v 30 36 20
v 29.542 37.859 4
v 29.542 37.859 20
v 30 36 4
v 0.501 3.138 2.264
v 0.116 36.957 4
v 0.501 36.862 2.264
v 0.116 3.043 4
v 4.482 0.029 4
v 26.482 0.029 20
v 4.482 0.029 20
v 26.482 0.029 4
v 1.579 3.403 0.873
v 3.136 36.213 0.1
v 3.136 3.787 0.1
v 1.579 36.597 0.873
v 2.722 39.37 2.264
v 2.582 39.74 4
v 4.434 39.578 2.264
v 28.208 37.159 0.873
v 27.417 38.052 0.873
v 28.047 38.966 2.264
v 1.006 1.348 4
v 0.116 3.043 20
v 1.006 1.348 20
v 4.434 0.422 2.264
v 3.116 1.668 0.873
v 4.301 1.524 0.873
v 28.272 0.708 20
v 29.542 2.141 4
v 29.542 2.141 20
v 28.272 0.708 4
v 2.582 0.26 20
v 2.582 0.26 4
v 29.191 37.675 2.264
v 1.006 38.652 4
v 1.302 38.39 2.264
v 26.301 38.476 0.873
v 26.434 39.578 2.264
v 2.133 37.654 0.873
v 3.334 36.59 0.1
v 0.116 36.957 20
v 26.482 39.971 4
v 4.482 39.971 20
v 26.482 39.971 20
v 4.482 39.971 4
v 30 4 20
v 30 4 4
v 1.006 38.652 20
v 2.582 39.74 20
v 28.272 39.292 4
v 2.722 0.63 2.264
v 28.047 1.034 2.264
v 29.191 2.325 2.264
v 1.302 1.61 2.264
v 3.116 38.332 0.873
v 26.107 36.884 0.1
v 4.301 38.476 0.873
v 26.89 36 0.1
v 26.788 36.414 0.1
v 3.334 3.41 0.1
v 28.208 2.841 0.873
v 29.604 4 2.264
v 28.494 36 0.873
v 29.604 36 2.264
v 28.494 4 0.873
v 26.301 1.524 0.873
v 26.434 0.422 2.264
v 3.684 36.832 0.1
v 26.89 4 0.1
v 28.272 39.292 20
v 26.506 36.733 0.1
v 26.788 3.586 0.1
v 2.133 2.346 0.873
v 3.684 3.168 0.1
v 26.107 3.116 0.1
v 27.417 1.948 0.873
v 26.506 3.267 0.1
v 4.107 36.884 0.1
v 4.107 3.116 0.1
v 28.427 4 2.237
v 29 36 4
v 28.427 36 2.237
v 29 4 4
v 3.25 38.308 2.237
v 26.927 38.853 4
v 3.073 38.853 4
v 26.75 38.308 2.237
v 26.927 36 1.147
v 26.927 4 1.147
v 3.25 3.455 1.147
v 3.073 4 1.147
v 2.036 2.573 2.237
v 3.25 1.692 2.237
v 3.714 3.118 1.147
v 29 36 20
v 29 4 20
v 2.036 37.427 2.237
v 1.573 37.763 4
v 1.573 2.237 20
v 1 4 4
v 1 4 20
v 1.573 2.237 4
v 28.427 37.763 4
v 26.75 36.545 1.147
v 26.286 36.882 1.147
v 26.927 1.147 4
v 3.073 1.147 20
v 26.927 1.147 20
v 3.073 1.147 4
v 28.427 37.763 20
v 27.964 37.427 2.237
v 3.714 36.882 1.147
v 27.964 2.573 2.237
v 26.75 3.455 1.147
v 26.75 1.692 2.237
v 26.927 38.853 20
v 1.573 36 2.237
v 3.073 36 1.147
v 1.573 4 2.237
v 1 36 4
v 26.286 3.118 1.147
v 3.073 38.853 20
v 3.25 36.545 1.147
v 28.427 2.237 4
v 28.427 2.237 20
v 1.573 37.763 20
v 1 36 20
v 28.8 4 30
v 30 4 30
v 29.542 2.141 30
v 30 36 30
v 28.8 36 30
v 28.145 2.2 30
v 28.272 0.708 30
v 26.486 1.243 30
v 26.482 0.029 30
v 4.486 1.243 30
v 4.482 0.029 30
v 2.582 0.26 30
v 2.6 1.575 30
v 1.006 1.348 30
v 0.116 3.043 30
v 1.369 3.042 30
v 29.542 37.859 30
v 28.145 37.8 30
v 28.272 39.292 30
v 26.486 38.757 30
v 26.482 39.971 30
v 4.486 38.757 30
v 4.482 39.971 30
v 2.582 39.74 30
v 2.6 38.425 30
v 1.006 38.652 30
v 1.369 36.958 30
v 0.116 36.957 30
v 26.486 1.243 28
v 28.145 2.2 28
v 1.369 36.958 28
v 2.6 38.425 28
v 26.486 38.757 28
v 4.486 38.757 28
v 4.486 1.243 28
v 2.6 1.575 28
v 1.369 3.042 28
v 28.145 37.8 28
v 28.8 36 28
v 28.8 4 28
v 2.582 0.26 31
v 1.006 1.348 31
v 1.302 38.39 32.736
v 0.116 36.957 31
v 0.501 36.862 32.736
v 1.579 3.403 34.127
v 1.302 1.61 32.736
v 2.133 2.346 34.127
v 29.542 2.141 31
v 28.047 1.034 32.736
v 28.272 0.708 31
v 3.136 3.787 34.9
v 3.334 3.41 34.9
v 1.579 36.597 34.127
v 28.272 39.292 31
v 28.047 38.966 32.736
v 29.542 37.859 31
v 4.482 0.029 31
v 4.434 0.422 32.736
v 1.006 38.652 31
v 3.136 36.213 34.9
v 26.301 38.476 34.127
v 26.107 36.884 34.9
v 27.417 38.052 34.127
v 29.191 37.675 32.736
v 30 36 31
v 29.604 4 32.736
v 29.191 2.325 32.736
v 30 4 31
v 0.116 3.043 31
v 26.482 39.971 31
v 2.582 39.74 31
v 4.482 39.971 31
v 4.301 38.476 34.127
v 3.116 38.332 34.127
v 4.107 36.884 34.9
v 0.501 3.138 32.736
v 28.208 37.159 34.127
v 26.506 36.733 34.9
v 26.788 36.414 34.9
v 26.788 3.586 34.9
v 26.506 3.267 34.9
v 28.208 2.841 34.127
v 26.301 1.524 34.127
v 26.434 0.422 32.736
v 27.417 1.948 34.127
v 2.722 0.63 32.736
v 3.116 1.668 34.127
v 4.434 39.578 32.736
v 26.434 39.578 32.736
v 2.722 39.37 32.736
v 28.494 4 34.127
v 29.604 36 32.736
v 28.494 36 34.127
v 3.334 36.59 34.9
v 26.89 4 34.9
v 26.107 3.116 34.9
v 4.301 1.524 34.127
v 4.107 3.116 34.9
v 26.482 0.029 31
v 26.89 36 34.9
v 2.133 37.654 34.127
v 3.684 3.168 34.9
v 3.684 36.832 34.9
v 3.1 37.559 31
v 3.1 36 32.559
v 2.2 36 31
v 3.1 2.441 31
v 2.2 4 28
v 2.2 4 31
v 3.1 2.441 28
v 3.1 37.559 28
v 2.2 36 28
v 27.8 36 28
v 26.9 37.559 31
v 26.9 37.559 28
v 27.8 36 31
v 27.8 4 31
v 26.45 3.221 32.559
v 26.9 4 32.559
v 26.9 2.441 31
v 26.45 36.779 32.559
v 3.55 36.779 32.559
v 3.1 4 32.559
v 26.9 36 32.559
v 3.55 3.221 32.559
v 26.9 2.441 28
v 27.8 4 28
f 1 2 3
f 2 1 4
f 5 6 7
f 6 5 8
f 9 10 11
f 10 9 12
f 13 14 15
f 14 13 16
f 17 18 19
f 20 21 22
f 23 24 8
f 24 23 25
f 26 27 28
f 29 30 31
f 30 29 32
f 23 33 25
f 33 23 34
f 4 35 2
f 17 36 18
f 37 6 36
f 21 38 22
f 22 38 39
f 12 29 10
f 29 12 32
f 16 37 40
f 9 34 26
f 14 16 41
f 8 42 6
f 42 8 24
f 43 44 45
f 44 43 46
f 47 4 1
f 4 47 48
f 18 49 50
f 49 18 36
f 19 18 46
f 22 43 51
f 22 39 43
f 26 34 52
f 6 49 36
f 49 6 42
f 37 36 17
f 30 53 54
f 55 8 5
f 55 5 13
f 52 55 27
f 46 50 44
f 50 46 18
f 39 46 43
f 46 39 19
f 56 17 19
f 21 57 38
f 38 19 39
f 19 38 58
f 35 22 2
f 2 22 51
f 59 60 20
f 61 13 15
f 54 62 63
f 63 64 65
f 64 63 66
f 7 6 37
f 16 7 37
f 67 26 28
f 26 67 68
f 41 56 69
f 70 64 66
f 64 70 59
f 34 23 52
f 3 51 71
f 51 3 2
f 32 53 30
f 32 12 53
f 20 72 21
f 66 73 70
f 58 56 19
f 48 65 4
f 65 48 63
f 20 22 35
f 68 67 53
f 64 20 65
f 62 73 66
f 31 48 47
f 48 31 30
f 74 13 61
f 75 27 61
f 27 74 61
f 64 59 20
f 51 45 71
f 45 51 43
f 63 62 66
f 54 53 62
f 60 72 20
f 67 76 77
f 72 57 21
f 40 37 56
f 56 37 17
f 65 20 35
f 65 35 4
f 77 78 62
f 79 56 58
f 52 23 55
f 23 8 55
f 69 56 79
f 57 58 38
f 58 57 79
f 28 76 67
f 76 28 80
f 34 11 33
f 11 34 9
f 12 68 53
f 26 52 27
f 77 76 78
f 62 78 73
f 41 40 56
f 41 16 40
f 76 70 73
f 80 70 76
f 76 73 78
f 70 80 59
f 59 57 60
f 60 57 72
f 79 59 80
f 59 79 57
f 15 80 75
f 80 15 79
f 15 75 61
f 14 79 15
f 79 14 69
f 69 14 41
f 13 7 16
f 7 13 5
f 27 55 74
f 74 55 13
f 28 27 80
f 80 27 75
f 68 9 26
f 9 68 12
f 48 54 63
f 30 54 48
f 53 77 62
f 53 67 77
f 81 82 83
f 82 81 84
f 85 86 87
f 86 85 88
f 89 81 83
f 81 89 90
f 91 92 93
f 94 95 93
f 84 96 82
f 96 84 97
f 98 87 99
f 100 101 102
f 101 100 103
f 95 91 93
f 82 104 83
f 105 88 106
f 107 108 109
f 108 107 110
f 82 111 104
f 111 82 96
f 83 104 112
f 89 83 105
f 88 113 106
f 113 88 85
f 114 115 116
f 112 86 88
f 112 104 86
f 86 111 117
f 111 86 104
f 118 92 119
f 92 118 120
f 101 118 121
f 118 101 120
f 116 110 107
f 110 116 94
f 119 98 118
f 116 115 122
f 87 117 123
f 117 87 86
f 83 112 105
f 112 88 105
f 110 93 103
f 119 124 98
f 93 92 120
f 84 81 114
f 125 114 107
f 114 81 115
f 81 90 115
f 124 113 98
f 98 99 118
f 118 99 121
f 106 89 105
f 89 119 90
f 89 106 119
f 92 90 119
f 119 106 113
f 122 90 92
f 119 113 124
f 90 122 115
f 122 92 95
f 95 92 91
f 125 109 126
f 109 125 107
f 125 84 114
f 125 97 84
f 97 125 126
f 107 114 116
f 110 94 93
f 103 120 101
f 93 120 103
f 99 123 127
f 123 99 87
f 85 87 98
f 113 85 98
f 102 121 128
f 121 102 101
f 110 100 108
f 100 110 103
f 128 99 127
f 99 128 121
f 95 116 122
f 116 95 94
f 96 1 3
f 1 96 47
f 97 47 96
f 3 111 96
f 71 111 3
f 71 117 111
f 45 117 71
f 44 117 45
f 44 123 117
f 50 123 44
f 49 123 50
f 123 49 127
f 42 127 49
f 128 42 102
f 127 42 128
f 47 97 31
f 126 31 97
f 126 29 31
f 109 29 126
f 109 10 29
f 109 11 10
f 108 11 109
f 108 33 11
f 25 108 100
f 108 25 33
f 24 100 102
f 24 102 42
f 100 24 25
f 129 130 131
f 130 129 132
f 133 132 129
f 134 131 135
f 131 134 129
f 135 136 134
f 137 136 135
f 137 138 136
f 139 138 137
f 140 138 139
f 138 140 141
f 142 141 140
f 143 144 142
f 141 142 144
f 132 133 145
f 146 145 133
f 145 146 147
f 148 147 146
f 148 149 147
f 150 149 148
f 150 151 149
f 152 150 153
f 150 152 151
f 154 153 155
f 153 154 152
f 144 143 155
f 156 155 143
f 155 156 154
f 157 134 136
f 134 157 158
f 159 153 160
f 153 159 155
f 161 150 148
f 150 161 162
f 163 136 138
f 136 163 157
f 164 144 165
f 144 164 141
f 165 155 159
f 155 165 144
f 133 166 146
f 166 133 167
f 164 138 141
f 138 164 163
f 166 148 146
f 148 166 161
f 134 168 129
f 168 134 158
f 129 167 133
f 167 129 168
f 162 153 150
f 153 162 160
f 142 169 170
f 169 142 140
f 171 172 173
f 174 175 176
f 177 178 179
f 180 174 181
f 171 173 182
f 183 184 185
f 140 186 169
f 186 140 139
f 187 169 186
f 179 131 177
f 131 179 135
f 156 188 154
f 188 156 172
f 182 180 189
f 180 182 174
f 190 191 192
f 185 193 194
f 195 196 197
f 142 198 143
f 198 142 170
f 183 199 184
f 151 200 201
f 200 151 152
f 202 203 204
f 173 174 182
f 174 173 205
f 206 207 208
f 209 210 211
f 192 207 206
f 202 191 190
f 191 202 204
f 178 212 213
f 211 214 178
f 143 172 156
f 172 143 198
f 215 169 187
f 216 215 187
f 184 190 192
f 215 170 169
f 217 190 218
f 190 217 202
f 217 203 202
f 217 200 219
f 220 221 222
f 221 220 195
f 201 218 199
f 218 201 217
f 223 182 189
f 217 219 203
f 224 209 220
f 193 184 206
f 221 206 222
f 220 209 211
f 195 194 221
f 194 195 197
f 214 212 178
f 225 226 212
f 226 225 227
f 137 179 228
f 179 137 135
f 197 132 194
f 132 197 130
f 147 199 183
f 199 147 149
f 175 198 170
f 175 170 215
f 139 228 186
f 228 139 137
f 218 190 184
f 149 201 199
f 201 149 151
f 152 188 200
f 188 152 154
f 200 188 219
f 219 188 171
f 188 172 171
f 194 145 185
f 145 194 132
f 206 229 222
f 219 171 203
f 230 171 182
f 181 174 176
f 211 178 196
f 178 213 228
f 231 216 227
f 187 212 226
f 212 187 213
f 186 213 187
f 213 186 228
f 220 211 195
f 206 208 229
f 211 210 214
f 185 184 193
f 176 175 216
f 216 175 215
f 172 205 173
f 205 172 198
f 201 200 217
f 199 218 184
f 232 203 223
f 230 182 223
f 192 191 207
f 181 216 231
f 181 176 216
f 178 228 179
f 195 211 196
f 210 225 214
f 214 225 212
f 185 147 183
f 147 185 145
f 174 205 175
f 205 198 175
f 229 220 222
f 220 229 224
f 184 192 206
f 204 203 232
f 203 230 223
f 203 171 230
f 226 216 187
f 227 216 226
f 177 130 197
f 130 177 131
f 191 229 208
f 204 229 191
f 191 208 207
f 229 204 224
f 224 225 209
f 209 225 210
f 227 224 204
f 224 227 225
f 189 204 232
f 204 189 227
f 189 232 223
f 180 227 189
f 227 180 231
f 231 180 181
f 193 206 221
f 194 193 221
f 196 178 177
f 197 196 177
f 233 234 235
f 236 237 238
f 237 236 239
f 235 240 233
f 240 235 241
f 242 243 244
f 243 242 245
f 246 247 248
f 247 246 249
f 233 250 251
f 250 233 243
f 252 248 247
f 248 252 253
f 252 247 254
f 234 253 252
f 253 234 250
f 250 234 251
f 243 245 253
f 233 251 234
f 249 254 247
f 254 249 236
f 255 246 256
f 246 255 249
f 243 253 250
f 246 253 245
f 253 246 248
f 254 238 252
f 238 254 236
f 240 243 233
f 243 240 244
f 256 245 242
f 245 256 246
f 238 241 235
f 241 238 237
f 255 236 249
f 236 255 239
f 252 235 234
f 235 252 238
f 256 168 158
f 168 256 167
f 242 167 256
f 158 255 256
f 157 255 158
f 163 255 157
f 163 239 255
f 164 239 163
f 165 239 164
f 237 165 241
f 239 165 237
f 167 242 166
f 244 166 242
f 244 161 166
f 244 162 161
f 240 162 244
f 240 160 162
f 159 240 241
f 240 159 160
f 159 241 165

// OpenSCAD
// file: struct.scad
// tool to allow key/value "structs" in openscad

/* 

// create an object that looks like:

obj = [
    ["height", 20],
    ["width", 30],
    ["flange", 1],
    ["offset", 3.2]
    ];

// access with
w = v(obj, "width");
// (w is now 30)

// optionally add a default value:
inset = v(obj, "inset", def=4);
// (inset is now 4)


// in scad values are not mutable but we can "modify" or add to an object with the concat() function
newObj = concat([["inset", 8], ["height", 45]], obj);

newInset = v(newObj, "inset", def=4);
// (newInset is 8)

h = v(newObj, "height");
// h takes the first value of "height" and gets 45

*/

function v(obj, key, def=0) = 
    search([key], obj) == [[]] ? def : obj[search([key], obj)[0]][1];
// main file
use <struct.scad>;

module roundedCuboid(xs,ys,zs,radius) {
    r = max(radius, 0.01);
	    
    hull() {
	for (x = [r, xs-r]) {
	    for (y = [r, ys-r]) {
		for (z = [r, zs-r]) {
		    translate([x,y,z]) sphere(r);
		}
	    }
	}
    }
}

module roundedEdge(xs, ys, zs, radius) {
    hull() {
	for (x = [radius, xs-radius]) {
	    for (y = [radius, ys-radius]) {
		translate([x,y,0]) cylinder(r=radius, h=zs);
	    }
	}
    }
}


module baseRoundedBox(boxDef) {
    x = v(boxDef, "x");
    y = v(boxDef, "y");
    z = v(boxDef, "lidZ");
    radius = v(boxDef, "radius");
    wall = v(boxDef, "wall");
    
    extraHeight = radius * 2;
    difference() {
	roundedCuboid(x,y,z+extraHeight, radius);
	translate([wall, wall, wall]) {
	    roundedCuboid(x-wall*2, y-wall*2, z-wall*2 + extraHeight, radius-wall);
	}
	translate([-1,-1, z]) {
	    cube([x+2, y+2, extraHeight+1]);
	}
    }
}

module baseRoundedBoxLid(boxDef) {
    x = v(boxDef, "x");
    y = v(boxDef, "y");
    lidZ = v(boxDef, "lidZ");
    z = v(boxDef, "z") - lidZ;
    radius = v(boxDef, "radius");
    wall = v(boxDef, "wall");
    lipHeight = v(boxDef, "lipHeight");
    lipWidth = v(boxDef, "lipWidth");
    lipGap = v(boxDef, "lipGap");
    

    extraDepth = radius * 2 + lipHeight;
    wallLip = wall+lipWidth+lipGap;

    translate([0,0,lidZ]) {
	difference() {
	    translate([0,0,-extraDepth]) {
		roundedCuboid(x,y,z+extraDepth, radius);
	    }
	    translate([wallLip, wallLip, -extraDepth]) {
		roundedCuboid(x-wallLip*2, y-wallLip*2, z+extraDepth-wallLip, radius-wallLip);
	    }
	    difference() {
		translate([-1, -1, -extraDepth-1]) {
		    roundedEdge(x+2, y+2, extraDepth+1, radius+1);
		}
		translate([wall+lipGap, wall+lipGap, -extraDepth-2]) {
		    roundedEdge(x-wall*2-lipGap*2, y-wall*2-lipGap*2, extraDepth+3, radius-wall-lipGap);
		}
	    }
	    translate([-1, -1, -extraDepth-1]) {
		cube([x+2, y+2, extraDepth-lipHeight+1]);
	    }
	}
    }
}

module roundedBox(boxDef) {
    baseRoundedBox(boxDef);
}

module roundedBoxLid(boxDef) {
    baseRoundedBoxLid(boxDef);
}

//$fn=30;

box = [
    ["x", 30],
    ["y", 40],
    ["z", 25],
    ["lidZ", 20],
    ["radius", 4],
    ["wall", 1],
    ["lipHeight", 2],
    ["lipWidth", 1],
    ["lipGap", 0.2],
    ];


roundedBox(box);

translate([0,0,10])
roundedBoxLid(box);
